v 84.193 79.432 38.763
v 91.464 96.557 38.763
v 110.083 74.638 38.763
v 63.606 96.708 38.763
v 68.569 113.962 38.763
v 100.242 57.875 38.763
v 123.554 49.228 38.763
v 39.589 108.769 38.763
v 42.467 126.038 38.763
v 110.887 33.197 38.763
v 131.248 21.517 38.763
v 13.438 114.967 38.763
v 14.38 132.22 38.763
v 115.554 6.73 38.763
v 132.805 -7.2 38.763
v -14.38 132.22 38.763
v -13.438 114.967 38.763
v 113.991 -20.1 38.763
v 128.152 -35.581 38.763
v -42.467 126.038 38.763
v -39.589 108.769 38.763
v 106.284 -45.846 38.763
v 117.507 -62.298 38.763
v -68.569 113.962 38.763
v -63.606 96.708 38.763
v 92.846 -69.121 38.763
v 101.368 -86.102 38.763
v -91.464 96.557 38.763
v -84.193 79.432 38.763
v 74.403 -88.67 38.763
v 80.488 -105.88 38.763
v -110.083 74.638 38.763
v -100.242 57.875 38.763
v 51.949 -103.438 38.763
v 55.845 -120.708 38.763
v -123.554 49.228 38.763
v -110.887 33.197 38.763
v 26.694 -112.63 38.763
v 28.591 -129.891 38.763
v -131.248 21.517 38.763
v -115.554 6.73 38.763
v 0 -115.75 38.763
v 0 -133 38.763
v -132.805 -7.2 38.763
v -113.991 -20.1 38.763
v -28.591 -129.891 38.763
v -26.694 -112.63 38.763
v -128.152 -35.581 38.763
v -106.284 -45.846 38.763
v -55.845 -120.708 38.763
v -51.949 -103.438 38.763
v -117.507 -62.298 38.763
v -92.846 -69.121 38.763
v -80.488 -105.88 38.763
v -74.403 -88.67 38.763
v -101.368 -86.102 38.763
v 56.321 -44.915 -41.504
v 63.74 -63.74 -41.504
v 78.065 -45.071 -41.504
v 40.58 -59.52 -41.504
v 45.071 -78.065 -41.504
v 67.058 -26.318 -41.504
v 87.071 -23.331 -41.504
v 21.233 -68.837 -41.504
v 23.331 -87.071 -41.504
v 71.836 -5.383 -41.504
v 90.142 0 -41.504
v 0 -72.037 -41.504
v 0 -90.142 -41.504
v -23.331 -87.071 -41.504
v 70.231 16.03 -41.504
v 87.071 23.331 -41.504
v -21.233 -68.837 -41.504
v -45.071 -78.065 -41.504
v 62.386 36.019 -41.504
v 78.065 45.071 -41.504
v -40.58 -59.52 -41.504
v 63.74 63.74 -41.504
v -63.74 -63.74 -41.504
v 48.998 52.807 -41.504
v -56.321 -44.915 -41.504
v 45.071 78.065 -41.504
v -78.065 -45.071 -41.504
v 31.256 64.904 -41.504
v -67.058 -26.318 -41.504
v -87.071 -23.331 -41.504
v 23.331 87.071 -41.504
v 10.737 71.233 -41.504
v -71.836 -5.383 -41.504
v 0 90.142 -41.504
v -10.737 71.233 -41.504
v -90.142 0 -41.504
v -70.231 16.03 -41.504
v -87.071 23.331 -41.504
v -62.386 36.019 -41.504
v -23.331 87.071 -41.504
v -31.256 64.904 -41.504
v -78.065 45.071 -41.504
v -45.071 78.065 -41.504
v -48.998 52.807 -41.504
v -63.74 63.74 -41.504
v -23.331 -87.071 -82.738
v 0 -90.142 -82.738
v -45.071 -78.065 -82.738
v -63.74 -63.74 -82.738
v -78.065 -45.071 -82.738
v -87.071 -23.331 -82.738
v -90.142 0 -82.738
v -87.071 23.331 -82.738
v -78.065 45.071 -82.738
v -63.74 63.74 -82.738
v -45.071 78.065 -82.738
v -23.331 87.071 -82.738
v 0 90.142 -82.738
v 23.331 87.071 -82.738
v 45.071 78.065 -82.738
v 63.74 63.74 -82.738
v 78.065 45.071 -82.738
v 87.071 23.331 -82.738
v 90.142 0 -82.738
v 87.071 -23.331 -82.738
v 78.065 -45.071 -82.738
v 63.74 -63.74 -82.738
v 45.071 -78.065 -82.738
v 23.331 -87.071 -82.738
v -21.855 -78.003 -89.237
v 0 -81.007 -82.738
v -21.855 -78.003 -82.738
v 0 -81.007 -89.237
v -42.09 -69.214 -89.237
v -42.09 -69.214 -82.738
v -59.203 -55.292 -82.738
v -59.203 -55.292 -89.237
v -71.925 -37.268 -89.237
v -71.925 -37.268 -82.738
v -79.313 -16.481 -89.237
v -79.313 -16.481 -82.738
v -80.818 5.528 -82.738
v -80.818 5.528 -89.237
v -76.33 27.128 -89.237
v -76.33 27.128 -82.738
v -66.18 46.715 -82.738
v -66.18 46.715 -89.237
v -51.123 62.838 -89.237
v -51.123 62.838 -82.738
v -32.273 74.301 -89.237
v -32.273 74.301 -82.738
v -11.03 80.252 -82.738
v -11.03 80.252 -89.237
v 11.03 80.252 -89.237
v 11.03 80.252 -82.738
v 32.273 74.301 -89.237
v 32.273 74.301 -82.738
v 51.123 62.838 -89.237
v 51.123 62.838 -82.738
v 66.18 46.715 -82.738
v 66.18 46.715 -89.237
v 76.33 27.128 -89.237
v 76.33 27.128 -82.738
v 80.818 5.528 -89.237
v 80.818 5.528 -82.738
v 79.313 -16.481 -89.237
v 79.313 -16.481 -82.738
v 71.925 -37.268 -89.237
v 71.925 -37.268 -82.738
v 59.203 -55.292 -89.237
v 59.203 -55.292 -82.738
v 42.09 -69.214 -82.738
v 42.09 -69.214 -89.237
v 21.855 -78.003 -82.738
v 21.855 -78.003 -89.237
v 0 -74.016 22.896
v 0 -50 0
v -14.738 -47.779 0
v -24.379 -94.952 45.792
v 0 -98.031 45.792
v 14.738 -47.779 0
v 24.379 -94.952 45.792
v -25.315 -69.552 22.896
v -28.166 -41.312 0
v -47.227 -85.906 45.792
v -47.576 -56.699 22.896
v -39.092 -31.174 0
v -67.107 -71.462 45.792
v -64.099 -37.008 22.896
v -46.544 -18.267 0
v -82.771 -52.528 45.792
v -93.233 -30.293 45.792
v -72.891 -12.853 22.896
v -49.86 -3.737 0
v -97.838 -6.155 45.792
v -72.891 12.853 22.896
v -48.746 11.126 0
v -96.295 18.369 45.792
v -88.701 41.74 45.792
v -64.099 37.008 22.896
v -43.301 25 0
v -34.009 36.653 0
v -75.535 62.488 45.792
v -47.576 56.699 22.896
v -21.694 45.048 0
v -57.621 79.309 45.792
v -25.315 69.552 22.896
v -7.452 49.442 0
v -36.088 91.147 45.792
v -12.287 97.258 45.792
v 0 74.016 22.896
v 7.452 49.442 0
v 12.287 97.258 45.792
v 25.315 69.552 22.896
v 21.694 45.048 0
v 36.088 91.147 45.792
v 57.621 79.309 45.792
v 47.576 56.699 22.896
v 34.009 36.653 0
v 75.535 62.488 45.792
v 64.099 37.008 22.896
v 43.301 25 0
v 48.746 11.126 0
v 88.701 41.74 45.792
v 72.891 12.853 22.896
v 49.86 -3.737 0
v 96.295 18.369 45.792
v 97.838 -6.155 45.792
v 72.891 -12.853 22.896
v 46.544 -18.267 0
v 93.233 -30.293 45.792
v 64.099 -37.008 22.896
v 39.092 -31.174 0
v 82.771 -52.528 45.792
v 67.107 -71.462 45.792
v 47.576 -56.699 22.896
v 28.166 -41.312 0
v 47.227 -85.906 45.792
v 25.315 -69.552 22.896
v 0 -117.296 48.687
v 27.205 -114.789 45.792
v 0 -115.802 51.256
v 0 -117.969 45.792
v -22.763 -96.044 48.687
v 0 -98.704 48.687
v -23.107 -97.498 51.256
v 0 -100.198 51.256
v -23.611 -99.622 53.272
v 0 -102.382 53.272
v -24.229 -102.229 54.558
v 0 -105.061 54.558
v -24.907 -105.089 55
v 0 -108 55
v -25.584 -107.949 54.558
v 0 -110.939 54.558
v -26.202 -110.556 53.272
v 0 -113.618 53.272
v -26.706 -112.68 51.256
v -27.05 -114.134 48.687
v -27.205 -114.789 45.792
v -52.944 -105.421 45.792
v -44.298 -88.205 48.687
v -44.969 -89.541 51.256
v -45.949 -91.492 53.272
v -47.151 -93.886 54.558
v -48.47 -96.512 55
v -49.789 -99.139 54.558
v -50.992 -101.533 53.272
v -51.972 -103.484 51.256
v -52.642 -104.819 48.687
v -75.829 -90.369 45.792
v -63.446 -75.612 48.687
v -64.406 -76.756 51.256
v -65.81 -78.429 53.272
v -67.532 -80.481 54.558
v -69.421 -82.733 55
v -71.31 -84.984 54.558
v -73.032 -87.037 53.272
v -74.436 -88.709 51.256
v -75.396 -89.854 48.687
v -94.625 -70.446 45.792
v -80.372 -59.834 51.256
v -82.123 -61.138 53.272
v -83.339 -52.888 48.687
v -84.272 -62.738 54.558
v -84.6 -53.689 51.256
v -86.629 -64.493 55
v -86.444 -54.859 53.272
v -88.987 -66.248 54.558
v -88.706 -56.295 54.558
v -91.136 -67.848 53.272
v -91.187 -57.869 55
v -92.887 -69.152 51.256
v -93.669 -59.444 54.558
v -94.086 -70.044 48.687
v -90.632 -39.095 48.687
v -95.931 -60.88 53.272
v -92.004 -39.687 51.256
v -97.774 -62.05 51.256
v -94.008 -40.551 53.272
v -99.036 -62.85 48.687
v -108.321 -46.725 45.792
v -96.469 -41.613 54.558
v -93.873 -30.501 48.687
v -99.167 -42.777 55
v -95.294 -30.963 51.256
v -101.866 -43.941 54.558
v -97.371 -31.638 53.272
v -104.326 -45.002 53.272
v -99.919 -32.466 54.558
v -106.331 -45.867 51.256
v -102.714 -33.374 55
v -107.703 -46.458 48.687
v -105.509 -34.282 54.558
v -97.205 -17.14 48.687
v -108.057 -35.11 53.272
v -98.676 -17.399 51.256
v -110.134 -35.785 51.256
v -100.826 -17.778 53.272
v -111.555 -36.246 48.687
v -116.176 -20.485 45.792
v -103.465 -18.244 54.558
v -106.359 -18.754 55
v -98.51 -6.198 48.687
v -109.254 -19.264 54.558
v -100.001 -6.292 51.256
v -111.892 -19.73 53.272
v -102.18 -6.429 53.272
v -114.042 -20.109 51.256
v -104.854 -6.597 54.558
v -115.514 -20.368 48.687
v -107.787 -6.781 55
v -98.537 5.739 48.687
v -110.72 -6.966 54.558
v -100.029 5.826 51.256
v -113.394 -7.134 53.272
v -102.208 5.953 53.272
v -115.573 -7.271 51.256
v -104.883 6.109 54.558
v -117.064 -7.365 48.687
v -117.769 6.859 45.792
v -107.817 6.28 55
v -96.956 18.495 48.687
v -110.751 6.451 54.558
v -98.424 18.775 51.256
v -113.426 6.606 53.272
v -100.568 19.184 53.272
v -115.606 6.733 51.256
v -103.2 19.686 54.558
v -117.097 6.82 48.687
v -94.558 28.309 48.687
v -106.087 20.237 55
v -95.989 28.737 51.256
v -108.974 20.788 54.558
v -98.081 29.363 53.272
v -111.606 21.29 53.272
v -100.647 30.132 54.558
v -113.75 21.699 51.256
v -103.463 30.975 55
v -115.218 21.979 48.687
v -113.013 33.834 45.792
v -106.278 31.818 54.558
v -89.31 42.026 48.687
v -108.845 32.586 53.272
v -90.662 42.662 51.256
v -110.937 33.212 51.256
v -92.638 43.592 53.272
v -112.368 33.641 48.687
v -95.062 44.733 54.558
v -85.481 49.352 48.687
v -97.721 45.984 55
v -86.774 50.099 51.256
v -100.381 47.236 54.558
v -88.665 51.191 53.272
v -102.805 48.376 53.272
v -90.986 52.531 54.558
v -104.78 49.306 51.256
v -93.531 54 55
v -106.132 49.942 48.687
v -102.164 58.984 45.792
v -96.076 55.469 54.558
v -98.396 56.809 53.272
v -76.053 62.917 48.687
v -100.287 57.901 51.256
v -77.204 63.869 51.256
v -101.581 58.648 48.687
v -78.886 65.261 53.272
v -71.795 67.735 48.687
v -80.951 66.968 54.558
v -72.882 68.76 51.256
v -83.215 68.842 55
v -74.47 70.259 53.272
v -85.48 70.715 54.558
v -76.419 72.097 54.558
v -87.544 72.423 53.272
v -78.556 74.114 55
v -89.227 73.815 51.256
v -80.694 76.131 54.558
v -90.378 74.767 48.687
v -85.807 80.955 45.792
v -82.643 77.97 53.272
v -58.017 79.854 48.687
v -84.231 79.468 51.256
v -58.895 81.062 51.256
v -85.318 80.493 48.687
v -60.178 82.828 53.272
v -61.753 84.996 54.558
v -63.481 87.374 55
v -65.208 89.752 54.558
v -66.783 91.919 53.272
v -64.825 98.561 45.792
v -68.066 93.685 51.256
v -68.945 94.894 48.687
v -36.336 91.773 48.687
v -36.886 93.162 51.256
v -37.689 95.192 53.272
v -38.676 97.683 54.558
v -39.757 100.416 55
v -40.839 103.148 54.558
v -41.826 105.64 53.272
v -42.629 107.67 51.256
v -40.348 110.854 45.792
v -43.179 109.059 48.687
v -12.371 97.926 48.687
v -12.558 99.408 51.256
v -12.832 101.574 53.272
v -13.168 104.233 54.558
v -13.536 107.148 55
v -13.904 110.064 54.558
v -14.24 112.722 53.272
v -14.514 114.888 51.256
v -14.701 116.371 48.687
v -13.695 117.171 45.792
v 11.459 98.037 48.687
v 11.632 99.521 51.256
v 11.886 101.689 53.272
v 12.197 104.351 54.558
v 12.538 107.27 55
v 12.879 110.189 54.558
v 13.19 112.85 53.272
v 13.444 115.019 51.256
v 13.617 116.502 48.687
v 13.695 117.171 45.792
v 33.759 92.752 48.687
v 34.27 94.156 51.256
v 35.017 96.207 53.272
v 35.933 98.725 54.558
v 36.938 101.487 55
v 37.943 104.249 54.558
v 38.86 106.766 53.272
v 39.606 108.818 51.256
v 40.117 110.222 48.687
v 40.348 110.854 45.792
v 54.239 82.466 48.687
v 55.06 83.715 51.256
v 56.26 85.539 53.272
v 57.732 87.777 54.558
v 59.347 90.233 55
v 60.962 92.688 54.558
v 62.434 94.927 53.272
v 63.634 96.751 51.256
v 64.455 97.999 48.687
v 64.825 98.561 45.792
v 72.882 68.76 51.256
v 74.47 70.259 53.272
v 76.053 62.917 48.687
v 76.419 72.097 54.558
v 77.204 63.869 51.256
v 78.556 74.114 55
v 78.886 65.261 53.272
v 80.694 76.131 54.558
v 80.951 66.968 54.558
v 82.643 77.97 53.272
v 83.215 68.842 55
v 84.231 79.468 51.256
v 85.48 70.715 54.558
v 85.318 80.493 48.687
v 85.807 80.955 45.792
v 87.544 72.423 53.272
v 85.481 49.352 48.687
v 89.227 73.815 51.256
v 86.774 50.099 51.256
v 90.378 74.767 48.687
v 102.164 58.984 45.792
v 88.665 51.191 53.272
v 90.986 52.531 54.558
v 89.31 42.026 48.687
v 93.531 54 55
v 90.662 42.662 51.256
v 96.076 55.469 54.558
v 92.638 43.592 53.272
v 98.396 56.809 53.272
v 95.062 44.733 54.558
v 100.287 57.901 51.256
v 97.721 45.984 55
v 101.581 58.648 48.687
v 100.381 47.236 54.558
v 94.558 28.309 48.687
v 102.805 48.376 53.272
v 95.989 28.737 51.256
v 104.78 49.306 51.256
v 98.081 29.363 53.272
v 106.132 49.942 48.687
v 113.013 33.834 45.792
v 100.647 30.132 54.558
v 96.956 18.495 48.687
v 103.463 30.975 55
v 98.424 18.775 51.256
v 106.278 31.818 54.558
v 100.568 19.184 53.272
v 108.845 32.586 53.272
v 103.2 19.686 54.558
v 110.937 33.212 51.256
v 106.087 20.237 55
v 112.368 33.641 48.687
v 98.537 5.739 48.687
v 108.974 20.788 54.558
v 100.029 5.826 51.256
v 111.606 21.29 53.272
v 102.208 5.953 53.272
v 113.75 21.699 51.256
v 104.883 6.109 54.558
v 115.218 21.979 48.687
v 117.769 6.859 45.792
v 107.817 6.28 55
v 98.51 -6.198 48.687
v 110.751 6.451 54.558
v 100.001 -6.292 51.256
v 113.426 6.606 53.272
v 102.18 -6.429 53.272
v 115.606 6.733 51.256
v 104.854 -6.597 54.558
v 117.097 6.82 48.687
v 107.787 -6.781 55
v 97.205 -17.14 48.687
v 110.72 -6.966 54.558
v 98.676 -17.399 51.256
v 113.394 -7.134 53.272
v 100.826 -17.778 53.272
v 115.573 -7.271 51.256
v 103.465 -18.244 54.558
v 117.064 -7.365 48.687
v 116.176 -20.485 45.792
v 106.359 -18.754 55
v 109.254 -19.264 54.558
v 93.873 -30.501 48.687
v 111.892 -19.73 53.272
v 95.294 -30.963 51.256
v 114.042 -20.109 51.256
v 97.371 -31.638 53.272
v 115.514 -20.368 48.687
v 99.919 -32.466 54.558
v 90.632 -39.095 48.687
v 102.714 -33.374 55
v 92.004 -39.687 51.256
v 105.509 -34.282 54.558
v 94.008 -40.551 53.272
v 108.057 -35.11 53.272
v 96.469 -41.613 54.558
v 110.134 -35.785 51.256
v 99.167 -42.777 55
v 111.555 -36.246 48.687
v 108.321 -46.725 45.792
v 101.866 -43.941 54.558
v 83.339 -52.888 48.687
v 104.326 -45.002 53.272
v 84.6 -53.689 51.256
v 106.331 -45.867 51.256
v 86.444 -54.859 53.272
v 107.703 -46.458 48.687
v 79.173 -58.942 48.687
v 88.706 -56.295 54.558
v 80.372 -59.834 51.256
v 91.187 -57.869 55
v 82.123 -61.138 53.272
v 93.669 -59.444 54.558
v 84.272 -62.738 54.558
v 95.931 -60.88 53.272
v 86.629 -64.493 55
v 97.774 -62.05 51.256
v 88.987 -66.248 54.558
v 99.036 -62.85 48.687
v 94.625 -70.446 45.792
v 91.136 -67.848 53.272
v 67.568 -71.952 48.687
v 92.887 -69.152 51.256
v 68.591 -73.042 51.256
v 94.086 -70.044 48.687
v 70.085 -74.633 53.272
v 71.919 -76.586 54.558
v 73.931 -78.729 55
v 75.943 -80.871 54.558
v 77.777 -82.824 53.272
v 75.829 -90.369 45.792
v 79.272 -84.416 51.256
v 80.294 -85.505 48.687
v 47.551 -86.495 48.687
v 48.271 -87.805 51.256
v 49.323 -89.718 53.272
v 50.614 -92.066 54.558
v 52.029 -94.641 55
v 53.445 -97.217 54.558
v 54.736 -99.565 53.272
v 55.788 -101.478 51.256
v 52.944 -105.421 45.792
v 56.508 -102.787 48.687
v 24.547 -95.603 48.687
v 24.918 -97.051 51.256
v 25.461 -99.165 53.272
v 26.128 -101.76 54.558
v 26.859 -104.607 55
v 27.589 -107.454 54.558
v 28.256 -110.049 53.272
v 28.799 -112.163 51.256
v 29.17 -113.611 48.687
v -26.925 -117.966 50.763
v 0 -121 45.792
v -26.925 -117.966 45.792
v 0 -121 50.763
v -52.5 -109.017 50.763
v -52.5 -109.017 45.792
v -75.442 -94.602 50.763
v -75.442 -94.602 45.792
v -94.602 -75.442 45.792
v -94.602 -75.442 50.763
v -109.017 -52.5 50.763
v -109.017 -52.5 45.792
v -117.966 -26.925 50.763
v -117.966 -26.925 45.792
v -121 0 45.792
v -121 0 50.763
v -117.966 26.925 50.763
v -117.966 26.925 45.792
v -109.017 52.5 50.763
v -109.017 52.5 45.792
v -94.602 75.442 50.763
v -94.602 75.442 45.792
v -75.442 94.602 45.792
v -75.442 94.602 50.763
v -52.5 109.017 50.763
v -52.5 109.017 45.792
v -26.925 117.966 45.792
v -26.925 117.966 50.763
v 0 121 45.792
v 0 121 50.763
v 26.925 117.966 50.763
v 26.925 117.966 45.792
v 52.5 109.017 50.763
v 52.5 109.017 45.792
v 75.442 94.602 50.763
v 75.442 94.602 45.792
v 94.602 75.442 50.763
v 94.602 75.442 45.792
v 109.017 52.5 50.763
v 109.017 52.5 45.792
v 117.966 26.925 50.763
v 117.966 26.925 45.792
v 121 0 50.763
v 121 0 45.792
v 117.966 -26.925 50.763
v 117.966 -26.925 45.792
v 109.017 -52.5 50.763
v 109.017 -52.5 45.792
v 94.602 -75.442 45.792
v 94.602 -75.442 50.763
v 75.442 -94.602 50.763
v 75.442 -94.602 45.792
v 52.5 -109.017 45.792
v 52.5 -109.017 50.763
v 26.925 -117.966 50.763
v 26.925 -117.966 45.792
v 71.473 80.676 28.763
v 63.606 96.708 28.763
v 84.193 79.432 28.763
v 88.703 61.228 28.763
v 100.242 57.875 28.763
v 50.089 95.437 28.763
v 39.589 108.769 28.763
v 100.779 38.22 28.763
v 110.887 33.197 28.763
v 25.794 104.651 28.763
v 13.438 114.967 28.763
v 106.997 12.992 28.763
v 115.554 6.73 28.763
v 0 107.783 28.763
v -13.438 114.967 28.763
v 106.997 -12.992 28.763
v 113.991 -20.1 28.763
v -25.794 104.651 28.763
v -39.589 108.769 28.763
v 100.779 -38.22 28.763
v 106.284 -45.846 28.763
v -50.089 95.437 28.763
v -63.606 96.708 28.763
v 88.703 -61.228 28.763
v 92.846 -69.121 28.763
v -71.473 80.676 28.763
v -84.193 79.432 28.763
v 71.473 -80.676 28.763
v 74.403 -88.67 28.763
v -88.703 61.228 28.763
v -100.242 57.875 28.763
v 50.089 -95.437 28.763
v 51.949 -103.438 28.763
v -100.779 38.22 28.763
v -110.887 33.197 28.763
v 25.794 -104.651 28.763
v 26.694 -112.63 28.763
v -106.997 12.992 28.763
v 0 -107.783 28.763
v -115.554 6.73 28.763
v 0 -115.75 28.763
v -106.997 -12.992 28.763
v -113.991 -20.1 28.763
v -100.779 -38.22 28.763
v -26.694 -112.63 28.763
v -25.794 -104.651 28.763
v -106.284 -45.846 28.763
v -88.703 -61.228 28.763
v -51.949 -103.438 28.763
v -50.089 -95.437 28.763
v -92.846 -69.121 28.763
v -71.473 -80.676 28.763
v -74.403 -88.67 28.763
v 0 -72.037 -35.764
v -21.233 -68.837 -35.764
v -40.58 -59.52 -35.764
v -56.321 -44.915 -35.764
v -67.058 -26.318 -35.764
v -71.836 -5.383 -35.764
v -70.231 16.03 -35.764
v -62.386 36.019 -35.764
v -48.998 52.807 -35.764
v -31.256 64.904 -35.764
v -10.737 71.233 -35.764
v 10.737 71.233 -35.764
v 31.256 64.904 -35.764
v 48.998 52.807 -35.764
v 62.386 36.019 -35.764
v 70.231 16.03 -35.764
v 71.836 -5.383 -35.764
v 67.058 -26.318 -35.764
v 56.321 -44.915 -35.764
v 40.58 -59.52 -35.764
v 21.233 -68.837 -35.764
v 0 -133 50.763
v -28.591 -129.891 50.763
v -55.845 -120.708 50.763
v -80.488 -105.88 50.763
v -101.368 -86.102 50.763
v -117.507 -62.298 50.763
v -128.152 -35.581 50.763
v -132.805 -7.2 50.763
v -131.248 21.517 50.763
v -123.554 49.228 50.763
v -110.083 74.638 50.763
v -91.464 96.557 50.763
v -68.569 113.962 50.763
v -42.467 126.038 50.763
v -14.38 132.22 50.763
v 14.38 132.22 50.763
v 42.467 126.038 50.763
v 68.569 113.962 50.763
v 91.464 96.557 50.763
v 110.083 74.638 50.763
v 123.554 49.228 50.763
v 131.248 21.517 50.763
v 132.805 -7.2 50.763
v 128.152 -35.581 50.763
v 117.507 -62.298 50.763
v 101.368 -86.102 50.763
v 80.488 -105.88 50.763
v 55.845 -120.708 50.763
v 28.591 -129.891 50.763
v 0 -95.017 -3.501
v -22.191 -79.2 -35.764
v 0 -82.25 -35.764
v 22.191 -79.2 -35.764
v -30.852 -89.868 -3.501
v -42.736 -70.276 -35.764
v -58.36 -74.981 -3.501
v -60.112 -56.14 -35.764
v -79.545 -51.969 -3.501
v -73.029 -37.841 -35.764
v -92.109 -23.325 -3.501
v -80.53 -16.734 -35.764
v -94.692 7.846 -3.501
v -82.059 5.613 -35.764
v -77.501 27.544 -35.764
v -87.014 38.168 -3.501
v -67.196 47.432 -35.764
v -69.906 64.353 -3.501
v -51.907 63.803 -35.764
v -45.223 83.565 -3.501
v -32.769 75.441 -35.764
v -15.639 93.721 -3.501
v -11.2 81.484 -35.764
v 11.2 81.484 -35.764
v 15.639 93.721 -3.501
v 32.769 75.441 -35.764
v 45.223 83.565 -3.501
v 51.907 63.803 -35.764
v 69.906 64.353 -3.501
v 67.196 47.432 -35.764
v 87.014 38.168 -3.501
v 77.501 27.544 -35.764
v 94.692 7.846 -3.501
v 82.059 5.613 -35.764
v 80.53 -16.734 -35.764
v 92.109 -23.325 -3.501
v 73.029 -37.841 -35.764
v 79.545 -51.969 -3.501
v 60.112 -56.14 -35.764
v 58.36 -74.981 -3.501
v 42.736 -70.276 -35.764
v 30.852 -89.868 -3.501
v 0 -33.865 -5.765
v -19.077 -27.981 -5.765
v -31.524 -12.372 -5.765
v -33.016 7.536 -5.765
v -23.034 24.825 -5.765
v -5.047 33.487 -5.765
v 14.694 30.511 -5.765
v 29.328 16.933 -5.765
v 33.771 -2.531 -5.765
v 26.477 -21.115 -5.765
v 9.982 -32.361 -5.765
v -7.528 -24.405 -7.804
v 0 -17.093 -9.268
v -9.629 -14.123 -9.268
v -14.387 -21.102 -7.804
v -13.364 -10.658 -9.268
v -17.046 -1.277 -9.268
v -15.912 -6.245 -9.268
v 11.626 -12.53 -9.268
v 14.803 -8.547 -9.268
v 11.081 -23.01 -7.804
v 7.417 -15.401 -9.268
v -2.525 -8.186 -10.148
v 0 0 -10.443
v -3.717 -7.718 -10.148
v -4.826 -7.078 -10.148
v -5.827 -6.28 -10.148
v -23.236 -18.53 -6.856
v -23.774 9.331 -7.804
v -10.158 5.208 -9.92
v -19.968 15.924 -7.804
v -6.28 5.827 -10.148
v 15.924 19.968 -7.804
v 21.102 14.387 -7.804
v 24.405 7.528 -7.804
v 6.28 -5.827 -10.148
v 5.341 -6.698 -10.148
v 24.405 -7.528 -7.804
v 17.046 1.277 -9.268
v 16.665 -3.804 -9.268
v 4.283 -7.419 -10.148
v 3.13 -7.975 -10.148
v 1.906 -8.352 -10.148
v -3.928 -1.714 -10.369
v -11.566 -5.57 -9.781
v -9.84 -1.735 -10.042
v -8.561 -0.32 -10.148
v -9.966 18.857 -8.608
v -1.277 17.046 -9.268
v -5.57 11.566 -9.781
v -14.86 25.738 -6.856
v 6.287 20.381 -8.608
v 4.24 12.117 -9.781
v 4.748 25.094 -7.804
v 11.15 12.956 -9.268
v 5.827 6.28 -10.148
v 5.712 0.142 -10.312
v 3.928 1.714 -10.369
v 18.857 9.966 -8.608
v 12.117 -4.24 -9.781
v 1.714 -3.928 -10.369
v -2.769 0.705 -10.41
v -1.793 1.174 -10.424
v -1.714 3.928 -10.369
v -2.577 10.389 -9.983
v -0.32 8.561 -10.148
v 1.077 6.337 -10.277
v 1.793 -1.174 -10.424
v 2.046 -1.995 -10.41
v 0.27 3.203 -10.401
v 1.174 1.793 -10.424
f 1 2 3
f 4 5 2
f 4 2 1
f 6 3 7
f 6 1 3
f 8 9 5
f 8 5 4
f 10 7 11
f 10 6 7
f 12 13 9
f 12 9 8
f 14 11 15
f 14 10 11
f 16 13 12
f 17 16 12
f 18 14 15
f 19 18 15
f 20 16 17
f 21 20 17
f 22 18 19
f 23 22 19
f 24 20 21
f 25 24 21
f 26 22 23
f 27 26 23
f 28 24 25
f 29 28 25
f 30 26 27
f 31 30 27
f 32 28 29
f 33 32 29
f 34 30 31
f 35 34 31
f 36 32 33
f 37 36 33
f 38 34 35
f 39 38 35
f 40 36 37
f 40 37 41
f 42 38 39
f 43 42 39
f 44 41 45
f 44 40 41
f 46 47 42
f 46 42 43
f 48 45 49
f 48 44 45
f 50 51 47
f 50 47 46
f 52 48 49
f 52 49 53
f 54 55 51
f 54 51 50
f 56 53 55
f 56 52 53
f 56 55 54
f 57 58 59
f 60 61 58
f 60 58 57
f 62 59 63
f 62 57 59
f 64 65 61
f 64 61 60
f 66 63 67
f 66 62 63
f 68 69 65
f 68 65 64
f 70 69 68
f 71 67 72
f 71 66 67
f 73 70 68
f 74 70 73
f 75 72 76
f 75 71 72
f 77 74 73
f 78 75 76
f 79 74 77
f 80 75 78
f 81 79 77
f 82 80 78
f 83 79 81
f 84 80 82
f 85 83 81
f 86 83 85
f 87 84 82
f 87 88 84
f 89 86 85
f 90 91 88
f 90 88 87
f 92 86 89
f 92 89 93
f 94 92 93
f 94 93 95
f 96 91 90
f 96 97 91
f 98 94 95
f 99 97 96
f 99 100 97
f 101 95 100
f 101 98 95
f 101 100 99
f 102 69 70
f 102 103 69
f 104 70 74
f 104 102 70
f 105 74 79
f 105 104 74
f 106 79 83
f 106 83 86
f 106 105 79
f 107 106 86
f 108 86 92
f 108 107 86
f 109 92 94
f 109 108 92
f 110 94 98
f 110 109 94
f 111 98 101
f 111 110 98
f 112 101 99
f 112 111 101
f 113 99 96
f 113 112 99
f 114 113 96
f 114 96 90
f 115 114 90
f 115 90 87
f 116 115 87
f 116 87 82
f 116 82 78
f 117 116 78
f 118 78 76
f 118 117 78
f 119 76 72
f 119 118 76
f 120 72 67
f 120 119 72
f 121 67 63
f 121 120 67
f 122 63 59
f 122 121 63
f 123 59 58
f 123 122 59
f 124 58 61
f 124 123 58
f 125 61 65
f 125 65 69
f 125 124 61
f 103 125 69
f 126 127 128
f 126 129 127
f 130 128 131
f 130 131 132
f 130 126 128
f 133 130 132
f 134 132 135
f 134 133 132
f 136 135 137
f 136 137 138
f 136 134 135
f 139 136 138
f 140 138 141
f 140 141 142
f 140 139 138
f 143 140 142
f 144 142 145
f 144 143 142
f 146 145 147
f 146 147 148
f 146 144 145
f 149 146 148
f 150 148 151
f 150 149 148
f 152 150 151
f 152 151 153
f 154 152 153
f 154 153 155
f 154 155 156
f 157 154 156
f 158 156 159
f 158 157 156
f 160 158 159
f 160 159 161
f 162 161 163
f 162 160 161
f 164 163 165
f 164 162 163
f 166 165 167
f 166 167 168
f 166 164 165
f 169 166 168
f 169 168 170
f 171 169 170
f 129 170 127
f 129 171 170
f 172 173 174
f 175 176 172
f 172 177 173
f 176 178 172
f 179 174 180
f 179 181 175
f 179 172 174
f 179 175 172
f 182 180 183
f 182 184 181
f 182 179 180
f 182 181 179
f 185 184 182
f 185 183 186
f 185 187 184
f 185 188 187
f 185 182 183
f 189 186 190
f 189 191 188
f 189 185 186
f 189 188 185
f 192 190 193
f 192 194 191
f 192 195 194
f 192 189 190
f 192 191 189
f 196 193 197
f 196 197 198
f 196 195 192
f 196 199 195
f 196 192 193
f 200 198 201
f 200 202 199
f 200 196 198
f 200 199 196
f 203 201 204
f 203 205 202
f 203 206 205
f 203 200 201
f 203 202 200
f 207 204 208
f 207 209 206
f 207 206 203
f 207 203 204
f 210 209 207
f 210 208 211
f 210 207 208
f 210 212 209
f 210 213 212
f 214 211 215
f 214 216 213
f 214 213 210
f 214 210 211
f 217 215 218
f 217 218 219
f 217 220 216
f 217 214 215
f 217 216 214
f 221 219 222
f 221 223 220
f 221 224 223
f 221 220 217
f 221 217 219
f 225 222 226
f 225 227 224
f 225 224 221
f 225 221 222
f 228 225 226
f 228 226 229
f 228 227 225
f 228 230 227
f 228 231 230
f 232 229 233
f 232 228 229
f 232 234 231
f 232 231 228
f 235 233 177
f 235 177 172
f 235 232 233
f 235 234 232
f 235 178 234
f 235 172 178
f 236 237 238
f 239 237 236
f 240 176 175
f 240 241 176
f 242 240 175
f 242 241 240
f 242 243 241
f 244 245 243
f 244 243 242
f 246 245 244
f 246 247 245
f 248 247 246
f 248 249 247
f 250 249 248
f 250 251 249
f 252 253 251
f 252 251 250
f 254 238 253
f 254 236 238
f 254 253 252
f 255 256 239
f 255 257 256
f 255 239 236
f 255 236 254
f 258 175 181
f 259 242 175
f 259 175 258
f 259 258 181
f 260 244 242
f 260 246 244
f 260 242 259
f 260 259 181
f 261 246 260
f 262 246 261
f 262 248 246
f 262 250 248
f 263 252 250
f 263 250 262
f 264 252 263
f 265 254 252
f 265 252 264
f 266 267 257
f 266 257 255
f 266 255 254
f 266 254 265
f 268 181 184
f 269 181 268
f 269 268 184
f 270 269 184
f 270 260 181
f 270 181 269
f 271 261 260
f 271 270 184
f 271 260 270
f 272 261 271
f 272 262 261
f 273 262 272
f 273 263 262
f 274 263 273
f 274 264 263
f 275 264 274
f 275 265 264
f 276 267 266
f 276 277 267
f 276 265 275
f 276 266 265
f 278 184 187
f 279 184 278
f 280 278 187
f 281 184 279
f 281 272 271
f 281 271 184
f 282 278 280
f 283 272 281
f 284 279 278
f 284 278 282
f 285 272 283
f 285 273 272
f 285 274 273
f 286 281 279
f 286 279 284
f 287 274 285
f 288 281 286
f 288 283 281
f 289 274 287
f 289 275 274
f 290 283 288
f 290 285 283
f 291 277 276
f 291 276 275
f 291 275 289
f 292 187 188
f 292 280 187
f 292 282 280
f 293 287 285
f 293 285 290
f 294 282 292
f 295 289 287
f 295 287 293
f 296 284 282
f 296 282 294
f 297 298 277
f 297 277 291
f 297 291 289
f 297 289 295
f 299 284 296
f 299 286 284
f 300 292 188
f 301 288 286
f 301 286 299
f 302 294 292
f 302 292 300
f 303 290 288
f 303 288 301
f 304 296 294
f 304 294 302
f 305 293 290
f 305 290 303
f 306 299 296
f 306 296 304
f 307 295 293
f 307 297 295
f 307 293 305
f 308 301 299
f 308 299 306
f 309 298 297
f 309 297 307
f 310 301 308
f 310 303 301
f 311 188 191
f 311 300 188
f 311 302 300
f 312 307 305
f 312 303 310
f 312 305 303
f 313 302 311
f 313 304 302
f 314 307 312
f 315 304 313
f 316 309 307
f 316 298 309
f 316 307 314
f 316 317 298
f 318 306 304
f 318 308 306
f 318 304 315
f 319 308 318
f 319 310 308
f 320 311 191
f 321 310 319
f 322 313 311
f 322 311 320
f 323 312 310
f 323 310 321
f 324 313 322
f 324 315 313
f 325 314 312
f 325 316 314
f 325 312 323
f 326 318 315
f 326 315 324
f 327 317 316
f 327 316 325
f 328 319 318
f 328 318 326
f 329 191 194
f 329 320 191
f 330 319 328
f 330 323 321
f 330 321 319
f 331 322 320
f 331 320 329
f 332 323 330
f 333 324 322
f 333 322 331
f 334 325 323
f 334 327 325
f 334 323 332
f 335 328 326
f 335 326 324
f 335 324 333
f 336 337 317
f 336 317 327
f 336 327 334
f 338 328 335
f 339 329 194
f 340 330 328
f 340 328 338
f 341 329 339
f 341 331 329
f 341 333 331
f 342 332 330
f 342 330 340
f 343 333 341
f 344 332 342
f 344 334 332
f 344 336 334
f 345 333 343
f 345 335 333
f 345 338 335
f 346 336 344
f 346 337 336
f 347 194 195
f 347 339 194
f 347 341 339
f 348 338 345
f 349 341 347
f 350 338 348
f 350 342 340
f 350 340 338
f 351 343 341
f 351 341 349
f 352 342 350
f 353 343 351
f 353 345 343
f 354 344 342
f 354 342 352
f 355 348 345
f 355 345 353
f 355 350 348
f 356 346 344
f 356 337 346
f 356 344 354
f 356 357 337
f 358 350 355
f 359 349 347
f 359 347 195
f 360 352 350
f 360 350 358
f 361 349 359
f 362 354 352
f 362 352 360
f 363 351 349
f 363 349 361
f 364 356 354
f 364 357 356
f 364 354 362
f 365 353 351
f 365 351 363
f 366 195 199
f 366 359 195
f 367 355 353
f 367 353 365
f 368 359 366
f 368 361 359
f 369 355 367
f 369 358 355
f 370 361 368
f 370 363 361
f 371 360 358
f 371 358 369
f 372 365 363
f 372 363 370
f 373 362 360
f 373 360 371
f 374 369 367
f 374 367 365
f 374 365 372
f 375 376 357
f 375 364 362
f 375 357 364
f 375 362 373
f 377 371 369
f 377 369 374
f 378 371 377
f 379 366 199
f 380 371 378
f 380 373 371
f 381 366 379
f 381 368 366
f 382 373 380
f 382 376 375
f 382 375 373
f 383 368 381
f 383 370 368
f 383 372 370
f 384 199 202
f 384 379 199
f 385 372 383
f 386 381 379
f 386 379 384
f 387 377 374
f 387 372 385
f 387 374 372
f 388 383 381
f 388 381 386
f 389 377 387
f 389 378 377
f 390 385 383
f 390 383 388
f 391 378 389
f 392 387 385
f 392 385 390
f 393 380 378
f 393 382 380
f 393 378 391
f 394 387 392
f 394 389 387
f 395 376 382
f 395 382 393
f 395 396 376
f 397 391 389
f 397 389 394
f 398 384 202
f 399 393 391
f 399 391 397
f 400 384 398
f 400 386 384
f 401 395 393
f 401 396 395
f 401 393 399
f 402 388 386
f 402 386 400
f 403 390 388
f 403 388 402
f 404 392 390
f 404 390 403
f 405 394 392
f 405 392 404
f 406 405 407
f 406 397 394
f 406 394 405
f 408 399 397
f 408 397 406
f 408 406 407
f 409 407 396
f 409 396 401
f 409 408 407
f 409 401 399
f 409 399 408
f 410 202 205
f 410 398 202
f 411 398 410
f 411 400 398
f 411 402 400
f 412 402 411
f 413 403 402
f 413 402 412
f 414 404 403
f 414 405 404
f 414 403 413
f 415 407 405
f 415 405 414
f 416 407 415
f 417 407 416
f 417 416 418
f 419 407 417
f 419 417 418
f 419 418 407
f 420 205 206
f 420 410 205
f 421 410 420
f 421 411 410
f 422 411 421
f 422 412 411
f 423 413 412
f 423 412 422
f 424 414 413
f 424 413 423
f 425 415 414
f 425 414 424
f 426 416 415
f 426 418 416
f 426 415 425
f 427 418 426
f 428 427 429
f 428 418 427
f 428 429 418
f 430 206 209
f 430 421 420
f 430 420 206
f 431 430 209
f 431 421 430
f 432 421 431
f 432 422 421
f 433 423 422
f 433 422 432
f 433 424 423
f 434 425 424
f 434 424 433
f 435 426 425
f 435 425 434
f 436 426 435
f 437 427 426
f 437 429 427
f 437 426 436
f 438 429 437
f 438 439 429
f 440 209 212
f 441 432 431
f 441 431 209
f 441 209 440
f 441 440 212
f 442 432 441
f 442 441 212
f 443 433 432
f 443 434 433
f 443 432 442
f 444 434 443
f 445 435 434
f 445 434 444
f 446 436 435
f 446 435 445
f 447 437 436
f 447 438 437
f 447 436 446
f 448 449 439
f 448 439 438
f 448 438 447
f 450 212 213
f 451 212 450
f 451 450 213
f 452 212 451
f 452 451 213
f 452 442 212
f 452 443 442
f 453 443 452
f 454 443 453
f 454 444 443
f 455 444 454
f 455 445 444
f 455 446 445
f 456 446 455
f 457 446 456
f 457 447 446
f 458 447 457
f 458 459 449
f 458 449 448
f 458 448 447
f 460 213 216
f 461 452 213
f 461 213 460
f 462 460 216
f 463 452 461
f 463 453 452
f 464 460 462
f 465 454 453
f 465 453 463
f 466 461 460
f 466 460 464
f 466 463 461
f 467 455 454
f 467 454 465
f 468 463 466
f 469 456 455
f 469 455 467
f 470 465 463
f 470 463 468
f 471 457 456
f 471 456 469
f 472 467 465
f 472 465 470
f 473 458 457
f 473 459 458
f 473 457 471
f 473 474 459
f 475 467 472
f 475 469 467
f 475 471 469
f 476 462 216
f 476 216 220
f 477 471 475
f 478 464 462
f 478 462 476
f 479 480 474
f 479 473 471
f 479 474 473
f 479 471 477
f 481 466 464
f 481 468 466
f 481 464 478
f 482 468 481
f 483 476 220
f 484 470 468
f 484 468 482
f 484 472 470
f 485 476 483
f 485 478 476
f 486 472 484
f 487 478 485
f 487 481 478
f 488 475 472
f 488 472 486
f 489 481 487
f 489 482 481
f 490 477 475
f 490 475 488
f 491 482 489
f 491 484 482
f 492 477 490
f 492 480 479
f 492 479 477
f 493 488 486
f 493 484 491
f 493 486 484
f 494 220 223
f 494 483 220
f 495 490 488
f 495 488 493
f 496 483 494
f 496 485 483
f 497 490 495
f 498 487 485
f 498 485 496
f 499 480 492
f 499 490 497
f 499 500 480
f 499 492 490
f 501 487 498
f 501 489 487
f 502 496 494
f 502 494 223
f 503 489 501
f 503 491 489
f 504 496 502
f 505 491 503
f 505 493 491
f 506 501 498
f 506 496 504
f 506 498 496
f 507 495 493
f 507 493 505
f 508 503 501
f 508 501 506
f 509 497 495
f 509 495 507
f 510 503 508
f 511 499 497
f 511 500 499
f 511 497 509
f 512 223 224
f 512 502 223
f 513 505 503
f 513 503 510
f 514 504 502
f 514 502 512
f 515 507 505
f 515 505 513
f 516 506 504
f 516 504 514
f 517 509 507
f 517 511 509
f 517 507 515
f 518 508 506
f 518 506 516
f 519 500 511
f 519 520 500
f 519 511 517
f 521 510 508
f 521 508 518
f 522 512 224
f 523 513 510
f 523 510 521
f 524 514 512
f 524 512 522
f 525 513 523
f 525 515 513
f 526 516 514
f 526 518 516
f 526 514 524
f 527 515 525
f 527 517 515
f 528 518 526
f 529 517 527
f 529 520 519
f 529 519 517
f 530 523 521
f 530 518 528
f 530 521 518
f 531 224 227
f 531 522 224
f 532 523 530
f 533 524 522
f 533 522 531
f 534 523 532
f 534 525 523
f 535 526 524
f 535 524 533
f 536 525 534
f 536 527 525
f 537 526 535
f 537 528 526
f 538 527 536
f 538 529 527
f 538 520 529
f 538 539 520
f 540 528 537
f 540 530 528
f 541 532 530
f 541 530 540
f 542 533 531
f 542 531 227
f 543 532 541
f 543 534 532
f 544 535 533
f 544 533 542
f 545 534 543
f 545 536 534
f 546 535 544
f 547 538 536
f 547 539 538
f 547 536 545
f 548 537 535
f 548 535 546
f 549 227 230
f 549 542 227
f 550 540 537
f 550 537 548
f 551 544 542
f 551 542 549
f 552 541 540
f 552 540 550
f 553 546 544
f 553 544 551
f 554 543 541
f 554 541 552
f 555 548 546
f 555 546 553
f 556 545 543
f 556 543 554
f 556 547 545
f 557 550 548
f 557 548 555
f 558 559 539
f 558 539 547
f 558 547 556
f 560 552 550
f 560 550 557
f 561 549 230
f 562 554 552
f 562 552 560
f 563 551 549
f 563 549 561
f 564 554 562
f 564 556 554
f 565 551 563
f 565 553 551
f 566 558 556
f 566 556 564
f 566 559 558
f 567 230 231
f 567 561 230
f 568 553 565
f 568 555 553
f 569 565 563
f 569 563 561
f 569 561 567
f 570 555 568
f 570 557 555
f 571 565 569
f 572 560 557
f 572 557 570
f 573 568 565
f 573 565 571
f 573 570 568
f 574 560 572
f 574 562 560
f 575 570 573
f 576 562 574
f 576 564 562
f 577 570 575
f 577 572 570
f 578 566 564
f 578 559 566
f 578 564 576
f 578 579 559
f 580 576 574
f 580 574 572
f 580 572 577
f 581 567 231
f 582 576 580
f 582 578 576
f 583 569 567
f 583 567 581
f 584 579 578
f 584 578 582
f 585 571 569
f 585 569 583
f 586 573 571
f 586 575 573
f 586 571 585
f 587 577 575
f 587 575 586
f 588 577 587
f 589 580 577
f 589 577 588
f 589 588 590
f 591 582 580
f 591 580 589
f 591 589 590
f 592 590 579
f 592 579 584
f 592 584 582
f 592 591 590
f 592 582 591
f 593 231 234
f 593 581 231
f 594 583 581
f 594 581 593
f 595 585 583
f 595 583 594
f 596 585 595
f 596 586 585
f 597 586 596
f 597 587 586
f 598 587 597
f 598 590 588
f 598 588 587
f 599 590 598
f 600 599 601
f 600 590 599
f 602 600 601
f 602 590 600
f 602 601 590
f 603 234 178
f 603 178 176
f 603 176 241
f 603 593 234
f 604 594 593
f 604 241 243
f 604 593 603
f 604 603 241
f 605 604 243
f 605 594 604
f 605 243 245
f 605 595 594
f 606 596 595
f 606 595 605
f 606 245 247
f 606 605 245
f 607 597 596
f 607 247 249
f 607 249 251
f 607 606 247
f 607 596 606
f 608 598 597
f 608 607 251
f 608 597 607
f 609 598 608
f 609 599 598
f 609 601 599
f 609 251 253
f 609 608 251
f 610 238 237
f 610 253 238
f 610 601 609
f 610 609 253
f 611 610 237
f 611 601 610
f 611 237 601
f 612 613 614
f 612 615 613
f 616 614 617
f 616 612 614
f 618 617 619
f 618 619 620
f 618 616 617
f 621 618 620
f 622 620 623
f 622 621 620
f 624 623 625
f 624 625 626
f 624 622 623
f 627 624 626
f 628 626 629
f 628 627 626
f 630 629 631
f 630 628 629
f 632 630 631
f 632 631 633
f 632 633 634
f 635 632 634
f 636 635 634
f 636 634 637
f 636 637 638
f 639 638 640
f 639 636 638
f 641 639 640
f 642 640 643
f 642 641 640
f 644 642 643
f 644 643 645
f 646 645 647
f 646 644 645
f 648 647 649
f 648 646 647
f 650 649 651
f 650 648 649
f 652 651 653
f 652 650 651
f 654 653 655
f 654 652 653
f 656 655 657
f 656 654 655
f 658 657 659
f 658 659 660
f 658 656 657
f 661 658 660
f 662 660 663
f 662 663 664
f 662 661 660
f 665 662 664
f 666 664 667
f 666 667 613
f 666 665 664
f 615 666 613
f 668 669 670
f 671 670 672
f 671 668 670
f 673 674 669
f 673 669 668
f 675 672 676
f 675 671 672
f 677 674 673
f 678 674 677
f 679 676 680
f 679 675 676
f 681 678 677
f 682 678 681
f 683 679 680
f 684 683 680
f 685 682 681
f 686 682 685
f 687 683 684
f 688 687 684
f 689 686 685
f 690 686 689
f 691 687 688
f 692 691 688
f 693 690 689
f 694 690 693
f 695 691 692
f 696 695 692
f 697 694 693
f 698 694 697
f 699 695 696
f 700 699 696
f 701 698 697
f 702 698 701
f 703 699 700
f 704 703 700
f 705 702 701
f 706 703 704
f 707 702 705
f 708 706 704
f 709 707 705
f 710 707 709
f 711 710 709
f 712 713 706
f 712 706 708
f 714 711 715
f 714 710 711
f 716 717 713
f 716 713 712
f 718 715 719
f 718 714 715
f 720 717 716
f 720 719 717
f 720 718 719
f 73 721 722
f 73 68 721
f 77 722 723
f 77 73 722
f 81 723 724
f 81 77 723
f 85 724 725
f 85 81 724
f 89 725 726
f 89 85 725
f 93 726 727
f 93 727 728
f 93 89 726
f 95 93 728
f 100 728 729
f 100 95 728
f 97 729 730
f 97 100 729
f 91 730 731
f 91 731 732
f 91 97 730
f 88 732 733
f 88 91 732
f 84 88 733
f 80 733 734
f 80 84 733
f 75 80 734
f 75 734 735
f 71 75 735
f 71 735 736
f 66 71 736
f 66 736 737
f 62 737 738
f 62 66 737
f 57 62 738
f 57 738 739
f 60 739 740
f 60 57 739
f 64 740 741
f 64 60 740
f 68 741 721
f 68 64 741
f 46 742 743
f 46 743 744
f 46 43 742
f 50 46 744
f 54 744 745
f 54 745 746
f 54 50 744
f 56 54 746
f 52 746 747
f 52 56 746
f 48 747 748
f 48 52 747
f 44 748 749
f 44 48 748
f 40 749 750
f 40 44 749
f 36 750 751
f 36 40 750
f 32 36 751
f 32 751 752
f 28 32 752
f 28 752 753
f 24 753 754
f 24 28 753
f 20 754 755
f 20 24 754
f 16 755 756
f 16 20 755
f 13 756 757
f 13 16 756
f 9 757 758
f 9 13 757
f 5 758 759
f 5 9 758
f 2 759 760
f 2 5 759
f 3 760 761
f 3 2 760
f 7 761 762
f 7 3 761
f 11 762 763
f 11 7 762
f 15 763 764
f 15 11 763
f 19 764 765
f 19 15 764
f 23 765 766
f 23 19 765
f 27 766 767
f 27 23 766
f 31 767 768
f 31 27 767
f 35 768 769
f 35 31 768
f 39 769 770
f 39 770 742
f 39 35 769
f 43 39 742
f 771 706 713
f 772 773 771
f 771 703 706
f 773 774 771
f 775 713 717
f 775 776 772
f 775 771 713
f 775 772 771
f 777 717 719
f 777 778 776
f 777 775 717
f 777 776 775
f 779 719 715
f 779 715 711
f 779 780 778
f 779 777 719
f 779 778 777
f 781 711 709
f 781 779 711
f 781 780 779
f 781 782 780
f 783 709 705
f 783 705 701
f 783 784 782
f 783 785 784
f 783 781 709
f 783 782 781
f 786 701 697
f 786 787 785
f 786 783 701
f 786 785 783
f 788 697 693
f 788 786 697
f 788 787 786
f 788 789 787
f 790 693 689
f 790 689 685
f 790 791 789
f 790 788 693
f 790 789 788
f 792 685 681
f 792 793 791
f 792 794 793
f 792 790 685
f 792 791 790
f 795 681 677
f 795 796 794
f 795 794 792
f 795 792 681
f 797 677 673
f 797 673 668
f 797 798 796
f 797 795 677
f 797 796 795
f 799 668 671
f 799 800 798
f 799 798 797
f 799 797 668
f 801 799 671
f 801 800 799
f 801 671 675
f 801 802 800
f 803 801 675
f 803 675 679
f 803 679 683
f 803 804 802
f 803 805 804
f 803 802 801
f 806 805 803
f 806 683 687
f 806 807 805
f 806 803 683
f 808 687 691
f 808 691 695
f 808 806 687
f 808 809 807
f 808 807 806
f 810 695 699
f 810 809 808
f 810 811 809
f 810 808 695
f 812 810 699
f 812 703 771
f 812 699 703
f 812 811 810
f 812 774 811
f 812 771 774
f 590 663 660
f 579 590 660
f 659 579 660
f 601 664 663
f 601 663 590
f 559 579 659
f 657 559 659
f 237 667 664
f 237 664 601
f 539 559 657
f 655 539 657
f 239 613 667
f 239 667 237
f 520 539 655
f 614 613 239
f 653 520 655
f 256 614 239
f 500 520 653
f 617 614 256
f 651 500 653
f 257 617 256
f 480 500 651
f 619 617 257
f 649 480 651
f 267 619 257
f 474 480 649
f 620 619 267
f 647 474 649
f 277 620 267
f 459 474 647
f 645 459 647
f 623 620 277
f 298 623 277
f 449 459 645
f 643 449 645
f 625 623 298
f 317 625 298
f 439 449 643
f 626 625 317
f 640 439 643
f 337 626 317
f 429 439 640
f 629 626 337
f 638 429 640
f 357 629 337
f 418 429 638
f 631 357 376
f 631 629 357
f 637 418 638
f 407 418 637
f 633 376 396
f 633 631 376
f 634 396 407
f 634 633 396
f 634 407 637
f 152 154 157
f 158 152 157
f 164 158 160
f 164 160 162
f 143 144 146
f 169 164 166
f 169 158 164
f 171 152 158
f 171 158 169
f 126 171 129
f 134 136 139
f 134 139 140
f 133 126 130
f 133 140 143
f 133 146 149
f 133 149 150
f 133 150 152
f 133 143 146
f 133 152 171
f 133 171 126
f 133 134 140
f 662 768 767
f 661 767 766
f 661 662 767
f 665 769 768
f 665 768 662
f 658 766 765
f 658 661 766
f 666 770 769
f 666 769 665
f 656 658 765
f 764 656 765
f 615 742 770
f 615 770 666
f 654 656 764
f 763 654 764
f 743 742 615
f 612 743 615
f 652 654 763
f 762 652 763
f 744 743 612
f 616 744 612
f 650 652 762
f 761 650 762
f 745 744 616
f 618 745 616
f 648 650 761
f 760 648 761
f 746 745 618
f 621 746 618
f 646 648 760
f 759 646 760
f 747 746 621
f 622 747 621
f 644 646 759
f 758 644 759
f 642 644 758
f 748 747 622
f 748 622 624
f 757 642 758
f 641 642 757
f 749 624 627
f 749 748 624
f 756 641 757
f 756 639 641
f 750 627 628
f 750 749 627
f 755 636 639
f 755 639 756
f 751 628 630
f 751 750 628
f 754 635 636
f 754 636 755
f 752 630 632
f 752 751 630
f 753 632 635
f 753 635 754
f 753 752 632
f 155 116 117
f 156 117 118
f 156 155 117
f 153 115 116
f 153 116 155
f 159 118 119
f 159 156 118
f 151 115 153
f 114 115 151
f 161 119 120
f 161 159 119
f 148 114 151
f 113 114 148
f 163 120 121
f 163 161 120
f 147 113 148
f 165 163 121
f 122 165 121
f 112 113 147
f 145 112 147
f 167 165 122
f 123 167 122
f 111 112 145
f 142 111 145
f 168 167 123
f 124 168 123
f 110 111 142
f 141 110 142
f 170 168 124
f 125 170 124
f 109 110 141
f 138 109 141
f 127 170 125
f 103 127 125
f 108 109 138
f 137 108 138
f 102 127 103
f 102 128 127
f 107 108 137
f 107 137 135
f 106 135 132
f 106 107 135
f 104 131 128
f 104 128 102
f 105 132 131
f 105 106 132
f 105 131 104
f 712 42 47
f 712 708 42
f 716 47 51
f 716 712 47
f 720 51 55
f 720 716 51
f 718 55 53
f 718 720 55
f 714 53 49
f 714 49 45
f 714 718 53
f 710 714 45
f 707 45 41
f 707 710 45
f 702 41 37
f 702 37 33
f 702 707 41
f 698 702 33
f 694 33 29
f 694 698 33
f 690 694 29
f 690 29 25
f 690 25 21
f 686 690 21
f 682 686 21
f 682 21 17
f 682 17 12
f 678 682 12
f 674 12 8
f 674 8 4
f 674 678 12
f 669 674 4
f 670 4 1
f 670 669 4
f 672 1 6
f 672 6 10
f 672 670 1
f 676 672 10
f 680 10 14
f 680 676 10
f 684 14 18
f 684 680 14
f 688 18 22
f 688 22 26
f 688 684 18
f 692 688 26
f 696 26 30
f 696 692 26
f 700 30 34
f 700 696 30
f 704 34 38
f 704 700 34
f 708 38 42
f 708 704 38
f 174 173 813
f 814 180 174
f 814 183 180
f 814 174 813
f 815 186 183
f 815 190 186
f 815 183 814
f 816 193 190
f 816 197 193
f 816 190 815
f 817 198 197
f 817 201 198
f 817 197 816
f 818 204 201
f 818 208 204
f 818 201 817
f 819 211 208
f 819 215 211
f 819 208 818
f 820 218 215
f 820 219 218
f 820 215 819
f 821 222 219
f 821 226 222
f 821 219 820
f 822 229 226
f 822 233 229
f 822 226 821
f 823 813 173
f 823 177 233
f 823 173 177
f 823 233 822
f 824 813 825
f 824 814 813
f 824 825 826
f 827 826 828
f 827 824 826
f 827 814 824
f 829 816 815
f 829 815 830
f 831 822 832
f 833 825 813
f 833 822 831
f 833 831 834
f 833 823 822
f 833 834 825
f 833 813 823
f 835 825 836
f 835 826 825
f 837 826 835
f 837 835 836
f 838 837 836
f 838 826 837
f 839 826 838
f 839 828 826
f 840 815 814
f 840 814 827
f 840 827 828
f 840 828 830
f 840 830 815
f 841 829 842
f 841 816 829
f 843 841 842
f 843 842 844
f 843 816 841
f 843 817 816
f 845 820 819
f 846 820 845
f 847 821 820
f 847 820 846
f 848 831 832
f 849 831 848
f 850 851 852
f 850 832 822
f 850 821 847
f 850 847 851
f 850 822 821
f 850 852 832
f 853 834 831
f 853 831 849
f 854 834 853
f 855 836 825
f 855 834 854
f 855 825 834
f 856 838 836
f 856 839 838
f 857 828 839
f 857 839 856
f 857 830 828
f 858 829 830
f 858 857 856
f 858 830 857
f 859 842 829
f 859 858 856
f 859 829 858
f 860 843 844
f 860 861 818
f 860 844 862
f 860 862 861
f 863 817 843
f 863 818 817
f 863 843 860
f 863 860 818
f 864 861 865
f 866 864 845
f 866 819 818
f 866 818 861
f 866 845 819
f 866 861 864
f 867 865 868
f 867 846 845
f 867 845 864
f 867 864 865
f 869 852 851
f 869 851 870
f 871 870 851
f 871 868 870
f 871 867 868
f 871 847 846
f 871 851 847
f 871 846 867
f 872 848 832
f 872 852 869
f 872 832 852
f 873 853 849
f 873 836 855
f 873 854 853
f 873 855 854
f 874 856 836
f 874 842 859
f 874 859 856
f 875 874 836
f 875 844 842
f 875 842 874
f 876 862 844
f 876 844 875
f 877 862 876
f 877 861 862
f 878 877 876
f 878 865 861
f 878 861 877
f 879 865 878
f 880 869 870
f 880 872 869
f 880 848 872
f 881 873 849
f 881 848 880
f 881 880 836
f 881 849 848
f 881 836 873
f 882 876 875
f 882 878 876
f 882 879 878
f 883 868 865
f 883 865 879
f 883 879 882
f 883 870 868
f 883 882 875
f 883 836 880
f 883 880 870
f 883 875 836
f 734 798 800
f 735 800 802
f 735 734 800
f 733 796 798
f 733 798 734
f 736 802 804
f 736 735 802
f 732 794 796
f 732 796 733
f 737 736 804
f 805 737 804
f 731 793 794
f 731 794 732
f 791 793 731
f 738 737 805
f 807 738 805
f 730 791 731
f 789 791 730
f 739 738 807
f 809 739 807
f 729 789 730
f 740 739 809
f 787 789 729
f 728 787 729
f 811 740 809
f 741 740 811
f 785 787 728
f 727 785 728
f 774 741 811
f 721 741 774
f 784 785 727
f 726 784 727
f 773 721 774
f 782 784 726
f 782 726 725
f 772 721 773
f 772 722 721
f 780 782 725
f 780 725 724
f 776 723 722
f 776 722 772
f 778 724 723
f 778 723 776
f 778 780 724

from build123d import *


with BuildPart() as f1:
    # F0 (on Right) → F1 (revolve)
    with BuildSketch(Plane.YZ):
        with BuildLine():
            Line((0, -89.237345), (0, -10.442538))
            ThreePointArc((0, -10.442538), (-25.539414, -7.80404), (-50, 0))
            Line((-50, 0), (-98.031412, 45.791994))
            ThreePointArc((-98.031412, 45.791994), (-108, 55), (-117.968588, 45.791994))
            Line((-117.968588, 45.791994), (-121, 45.791994))
            Line((-121, 45.791994), (-121, 50.762655))
            Line((-121, 50.762655), (-133, 50.762655))
            Line((-133, 50.762655), (-133, 38.762655))
            Line((-133, 38.762655), (-115.75, 38.762655))
            Line((-115.75, 38.762655), (-115.75, 28.762655))
            Line((-115.75, 28.762655), (-107.782677, 28.762655))
            Line((-107.782677, 28.762655), (-82.250395, -35.764394))
            Line((-82.250395, -35.764394), (-72.037482, -35.764394))
            Line((-72.037482, -35.764394), (-72.037482, -41.503783))
            Line((-72.037482, -41.503783), (-90.14219, -41.503783))
            Line((-90.14219, -41.503783), (-90.14219, -82.738219))
            Line((-90.14219, -82.738219), (-81.00698, -82.738219))
            Line((-81.00698, -82.738219), (-81.00698, -89.237345))
            Line((-81.00698, -89.237345), (0, -89.237345))
        make_face()
    revolve(axis=Axis((0, 0, -49.839942), (0, 0, -1)))


solid = f1.part
